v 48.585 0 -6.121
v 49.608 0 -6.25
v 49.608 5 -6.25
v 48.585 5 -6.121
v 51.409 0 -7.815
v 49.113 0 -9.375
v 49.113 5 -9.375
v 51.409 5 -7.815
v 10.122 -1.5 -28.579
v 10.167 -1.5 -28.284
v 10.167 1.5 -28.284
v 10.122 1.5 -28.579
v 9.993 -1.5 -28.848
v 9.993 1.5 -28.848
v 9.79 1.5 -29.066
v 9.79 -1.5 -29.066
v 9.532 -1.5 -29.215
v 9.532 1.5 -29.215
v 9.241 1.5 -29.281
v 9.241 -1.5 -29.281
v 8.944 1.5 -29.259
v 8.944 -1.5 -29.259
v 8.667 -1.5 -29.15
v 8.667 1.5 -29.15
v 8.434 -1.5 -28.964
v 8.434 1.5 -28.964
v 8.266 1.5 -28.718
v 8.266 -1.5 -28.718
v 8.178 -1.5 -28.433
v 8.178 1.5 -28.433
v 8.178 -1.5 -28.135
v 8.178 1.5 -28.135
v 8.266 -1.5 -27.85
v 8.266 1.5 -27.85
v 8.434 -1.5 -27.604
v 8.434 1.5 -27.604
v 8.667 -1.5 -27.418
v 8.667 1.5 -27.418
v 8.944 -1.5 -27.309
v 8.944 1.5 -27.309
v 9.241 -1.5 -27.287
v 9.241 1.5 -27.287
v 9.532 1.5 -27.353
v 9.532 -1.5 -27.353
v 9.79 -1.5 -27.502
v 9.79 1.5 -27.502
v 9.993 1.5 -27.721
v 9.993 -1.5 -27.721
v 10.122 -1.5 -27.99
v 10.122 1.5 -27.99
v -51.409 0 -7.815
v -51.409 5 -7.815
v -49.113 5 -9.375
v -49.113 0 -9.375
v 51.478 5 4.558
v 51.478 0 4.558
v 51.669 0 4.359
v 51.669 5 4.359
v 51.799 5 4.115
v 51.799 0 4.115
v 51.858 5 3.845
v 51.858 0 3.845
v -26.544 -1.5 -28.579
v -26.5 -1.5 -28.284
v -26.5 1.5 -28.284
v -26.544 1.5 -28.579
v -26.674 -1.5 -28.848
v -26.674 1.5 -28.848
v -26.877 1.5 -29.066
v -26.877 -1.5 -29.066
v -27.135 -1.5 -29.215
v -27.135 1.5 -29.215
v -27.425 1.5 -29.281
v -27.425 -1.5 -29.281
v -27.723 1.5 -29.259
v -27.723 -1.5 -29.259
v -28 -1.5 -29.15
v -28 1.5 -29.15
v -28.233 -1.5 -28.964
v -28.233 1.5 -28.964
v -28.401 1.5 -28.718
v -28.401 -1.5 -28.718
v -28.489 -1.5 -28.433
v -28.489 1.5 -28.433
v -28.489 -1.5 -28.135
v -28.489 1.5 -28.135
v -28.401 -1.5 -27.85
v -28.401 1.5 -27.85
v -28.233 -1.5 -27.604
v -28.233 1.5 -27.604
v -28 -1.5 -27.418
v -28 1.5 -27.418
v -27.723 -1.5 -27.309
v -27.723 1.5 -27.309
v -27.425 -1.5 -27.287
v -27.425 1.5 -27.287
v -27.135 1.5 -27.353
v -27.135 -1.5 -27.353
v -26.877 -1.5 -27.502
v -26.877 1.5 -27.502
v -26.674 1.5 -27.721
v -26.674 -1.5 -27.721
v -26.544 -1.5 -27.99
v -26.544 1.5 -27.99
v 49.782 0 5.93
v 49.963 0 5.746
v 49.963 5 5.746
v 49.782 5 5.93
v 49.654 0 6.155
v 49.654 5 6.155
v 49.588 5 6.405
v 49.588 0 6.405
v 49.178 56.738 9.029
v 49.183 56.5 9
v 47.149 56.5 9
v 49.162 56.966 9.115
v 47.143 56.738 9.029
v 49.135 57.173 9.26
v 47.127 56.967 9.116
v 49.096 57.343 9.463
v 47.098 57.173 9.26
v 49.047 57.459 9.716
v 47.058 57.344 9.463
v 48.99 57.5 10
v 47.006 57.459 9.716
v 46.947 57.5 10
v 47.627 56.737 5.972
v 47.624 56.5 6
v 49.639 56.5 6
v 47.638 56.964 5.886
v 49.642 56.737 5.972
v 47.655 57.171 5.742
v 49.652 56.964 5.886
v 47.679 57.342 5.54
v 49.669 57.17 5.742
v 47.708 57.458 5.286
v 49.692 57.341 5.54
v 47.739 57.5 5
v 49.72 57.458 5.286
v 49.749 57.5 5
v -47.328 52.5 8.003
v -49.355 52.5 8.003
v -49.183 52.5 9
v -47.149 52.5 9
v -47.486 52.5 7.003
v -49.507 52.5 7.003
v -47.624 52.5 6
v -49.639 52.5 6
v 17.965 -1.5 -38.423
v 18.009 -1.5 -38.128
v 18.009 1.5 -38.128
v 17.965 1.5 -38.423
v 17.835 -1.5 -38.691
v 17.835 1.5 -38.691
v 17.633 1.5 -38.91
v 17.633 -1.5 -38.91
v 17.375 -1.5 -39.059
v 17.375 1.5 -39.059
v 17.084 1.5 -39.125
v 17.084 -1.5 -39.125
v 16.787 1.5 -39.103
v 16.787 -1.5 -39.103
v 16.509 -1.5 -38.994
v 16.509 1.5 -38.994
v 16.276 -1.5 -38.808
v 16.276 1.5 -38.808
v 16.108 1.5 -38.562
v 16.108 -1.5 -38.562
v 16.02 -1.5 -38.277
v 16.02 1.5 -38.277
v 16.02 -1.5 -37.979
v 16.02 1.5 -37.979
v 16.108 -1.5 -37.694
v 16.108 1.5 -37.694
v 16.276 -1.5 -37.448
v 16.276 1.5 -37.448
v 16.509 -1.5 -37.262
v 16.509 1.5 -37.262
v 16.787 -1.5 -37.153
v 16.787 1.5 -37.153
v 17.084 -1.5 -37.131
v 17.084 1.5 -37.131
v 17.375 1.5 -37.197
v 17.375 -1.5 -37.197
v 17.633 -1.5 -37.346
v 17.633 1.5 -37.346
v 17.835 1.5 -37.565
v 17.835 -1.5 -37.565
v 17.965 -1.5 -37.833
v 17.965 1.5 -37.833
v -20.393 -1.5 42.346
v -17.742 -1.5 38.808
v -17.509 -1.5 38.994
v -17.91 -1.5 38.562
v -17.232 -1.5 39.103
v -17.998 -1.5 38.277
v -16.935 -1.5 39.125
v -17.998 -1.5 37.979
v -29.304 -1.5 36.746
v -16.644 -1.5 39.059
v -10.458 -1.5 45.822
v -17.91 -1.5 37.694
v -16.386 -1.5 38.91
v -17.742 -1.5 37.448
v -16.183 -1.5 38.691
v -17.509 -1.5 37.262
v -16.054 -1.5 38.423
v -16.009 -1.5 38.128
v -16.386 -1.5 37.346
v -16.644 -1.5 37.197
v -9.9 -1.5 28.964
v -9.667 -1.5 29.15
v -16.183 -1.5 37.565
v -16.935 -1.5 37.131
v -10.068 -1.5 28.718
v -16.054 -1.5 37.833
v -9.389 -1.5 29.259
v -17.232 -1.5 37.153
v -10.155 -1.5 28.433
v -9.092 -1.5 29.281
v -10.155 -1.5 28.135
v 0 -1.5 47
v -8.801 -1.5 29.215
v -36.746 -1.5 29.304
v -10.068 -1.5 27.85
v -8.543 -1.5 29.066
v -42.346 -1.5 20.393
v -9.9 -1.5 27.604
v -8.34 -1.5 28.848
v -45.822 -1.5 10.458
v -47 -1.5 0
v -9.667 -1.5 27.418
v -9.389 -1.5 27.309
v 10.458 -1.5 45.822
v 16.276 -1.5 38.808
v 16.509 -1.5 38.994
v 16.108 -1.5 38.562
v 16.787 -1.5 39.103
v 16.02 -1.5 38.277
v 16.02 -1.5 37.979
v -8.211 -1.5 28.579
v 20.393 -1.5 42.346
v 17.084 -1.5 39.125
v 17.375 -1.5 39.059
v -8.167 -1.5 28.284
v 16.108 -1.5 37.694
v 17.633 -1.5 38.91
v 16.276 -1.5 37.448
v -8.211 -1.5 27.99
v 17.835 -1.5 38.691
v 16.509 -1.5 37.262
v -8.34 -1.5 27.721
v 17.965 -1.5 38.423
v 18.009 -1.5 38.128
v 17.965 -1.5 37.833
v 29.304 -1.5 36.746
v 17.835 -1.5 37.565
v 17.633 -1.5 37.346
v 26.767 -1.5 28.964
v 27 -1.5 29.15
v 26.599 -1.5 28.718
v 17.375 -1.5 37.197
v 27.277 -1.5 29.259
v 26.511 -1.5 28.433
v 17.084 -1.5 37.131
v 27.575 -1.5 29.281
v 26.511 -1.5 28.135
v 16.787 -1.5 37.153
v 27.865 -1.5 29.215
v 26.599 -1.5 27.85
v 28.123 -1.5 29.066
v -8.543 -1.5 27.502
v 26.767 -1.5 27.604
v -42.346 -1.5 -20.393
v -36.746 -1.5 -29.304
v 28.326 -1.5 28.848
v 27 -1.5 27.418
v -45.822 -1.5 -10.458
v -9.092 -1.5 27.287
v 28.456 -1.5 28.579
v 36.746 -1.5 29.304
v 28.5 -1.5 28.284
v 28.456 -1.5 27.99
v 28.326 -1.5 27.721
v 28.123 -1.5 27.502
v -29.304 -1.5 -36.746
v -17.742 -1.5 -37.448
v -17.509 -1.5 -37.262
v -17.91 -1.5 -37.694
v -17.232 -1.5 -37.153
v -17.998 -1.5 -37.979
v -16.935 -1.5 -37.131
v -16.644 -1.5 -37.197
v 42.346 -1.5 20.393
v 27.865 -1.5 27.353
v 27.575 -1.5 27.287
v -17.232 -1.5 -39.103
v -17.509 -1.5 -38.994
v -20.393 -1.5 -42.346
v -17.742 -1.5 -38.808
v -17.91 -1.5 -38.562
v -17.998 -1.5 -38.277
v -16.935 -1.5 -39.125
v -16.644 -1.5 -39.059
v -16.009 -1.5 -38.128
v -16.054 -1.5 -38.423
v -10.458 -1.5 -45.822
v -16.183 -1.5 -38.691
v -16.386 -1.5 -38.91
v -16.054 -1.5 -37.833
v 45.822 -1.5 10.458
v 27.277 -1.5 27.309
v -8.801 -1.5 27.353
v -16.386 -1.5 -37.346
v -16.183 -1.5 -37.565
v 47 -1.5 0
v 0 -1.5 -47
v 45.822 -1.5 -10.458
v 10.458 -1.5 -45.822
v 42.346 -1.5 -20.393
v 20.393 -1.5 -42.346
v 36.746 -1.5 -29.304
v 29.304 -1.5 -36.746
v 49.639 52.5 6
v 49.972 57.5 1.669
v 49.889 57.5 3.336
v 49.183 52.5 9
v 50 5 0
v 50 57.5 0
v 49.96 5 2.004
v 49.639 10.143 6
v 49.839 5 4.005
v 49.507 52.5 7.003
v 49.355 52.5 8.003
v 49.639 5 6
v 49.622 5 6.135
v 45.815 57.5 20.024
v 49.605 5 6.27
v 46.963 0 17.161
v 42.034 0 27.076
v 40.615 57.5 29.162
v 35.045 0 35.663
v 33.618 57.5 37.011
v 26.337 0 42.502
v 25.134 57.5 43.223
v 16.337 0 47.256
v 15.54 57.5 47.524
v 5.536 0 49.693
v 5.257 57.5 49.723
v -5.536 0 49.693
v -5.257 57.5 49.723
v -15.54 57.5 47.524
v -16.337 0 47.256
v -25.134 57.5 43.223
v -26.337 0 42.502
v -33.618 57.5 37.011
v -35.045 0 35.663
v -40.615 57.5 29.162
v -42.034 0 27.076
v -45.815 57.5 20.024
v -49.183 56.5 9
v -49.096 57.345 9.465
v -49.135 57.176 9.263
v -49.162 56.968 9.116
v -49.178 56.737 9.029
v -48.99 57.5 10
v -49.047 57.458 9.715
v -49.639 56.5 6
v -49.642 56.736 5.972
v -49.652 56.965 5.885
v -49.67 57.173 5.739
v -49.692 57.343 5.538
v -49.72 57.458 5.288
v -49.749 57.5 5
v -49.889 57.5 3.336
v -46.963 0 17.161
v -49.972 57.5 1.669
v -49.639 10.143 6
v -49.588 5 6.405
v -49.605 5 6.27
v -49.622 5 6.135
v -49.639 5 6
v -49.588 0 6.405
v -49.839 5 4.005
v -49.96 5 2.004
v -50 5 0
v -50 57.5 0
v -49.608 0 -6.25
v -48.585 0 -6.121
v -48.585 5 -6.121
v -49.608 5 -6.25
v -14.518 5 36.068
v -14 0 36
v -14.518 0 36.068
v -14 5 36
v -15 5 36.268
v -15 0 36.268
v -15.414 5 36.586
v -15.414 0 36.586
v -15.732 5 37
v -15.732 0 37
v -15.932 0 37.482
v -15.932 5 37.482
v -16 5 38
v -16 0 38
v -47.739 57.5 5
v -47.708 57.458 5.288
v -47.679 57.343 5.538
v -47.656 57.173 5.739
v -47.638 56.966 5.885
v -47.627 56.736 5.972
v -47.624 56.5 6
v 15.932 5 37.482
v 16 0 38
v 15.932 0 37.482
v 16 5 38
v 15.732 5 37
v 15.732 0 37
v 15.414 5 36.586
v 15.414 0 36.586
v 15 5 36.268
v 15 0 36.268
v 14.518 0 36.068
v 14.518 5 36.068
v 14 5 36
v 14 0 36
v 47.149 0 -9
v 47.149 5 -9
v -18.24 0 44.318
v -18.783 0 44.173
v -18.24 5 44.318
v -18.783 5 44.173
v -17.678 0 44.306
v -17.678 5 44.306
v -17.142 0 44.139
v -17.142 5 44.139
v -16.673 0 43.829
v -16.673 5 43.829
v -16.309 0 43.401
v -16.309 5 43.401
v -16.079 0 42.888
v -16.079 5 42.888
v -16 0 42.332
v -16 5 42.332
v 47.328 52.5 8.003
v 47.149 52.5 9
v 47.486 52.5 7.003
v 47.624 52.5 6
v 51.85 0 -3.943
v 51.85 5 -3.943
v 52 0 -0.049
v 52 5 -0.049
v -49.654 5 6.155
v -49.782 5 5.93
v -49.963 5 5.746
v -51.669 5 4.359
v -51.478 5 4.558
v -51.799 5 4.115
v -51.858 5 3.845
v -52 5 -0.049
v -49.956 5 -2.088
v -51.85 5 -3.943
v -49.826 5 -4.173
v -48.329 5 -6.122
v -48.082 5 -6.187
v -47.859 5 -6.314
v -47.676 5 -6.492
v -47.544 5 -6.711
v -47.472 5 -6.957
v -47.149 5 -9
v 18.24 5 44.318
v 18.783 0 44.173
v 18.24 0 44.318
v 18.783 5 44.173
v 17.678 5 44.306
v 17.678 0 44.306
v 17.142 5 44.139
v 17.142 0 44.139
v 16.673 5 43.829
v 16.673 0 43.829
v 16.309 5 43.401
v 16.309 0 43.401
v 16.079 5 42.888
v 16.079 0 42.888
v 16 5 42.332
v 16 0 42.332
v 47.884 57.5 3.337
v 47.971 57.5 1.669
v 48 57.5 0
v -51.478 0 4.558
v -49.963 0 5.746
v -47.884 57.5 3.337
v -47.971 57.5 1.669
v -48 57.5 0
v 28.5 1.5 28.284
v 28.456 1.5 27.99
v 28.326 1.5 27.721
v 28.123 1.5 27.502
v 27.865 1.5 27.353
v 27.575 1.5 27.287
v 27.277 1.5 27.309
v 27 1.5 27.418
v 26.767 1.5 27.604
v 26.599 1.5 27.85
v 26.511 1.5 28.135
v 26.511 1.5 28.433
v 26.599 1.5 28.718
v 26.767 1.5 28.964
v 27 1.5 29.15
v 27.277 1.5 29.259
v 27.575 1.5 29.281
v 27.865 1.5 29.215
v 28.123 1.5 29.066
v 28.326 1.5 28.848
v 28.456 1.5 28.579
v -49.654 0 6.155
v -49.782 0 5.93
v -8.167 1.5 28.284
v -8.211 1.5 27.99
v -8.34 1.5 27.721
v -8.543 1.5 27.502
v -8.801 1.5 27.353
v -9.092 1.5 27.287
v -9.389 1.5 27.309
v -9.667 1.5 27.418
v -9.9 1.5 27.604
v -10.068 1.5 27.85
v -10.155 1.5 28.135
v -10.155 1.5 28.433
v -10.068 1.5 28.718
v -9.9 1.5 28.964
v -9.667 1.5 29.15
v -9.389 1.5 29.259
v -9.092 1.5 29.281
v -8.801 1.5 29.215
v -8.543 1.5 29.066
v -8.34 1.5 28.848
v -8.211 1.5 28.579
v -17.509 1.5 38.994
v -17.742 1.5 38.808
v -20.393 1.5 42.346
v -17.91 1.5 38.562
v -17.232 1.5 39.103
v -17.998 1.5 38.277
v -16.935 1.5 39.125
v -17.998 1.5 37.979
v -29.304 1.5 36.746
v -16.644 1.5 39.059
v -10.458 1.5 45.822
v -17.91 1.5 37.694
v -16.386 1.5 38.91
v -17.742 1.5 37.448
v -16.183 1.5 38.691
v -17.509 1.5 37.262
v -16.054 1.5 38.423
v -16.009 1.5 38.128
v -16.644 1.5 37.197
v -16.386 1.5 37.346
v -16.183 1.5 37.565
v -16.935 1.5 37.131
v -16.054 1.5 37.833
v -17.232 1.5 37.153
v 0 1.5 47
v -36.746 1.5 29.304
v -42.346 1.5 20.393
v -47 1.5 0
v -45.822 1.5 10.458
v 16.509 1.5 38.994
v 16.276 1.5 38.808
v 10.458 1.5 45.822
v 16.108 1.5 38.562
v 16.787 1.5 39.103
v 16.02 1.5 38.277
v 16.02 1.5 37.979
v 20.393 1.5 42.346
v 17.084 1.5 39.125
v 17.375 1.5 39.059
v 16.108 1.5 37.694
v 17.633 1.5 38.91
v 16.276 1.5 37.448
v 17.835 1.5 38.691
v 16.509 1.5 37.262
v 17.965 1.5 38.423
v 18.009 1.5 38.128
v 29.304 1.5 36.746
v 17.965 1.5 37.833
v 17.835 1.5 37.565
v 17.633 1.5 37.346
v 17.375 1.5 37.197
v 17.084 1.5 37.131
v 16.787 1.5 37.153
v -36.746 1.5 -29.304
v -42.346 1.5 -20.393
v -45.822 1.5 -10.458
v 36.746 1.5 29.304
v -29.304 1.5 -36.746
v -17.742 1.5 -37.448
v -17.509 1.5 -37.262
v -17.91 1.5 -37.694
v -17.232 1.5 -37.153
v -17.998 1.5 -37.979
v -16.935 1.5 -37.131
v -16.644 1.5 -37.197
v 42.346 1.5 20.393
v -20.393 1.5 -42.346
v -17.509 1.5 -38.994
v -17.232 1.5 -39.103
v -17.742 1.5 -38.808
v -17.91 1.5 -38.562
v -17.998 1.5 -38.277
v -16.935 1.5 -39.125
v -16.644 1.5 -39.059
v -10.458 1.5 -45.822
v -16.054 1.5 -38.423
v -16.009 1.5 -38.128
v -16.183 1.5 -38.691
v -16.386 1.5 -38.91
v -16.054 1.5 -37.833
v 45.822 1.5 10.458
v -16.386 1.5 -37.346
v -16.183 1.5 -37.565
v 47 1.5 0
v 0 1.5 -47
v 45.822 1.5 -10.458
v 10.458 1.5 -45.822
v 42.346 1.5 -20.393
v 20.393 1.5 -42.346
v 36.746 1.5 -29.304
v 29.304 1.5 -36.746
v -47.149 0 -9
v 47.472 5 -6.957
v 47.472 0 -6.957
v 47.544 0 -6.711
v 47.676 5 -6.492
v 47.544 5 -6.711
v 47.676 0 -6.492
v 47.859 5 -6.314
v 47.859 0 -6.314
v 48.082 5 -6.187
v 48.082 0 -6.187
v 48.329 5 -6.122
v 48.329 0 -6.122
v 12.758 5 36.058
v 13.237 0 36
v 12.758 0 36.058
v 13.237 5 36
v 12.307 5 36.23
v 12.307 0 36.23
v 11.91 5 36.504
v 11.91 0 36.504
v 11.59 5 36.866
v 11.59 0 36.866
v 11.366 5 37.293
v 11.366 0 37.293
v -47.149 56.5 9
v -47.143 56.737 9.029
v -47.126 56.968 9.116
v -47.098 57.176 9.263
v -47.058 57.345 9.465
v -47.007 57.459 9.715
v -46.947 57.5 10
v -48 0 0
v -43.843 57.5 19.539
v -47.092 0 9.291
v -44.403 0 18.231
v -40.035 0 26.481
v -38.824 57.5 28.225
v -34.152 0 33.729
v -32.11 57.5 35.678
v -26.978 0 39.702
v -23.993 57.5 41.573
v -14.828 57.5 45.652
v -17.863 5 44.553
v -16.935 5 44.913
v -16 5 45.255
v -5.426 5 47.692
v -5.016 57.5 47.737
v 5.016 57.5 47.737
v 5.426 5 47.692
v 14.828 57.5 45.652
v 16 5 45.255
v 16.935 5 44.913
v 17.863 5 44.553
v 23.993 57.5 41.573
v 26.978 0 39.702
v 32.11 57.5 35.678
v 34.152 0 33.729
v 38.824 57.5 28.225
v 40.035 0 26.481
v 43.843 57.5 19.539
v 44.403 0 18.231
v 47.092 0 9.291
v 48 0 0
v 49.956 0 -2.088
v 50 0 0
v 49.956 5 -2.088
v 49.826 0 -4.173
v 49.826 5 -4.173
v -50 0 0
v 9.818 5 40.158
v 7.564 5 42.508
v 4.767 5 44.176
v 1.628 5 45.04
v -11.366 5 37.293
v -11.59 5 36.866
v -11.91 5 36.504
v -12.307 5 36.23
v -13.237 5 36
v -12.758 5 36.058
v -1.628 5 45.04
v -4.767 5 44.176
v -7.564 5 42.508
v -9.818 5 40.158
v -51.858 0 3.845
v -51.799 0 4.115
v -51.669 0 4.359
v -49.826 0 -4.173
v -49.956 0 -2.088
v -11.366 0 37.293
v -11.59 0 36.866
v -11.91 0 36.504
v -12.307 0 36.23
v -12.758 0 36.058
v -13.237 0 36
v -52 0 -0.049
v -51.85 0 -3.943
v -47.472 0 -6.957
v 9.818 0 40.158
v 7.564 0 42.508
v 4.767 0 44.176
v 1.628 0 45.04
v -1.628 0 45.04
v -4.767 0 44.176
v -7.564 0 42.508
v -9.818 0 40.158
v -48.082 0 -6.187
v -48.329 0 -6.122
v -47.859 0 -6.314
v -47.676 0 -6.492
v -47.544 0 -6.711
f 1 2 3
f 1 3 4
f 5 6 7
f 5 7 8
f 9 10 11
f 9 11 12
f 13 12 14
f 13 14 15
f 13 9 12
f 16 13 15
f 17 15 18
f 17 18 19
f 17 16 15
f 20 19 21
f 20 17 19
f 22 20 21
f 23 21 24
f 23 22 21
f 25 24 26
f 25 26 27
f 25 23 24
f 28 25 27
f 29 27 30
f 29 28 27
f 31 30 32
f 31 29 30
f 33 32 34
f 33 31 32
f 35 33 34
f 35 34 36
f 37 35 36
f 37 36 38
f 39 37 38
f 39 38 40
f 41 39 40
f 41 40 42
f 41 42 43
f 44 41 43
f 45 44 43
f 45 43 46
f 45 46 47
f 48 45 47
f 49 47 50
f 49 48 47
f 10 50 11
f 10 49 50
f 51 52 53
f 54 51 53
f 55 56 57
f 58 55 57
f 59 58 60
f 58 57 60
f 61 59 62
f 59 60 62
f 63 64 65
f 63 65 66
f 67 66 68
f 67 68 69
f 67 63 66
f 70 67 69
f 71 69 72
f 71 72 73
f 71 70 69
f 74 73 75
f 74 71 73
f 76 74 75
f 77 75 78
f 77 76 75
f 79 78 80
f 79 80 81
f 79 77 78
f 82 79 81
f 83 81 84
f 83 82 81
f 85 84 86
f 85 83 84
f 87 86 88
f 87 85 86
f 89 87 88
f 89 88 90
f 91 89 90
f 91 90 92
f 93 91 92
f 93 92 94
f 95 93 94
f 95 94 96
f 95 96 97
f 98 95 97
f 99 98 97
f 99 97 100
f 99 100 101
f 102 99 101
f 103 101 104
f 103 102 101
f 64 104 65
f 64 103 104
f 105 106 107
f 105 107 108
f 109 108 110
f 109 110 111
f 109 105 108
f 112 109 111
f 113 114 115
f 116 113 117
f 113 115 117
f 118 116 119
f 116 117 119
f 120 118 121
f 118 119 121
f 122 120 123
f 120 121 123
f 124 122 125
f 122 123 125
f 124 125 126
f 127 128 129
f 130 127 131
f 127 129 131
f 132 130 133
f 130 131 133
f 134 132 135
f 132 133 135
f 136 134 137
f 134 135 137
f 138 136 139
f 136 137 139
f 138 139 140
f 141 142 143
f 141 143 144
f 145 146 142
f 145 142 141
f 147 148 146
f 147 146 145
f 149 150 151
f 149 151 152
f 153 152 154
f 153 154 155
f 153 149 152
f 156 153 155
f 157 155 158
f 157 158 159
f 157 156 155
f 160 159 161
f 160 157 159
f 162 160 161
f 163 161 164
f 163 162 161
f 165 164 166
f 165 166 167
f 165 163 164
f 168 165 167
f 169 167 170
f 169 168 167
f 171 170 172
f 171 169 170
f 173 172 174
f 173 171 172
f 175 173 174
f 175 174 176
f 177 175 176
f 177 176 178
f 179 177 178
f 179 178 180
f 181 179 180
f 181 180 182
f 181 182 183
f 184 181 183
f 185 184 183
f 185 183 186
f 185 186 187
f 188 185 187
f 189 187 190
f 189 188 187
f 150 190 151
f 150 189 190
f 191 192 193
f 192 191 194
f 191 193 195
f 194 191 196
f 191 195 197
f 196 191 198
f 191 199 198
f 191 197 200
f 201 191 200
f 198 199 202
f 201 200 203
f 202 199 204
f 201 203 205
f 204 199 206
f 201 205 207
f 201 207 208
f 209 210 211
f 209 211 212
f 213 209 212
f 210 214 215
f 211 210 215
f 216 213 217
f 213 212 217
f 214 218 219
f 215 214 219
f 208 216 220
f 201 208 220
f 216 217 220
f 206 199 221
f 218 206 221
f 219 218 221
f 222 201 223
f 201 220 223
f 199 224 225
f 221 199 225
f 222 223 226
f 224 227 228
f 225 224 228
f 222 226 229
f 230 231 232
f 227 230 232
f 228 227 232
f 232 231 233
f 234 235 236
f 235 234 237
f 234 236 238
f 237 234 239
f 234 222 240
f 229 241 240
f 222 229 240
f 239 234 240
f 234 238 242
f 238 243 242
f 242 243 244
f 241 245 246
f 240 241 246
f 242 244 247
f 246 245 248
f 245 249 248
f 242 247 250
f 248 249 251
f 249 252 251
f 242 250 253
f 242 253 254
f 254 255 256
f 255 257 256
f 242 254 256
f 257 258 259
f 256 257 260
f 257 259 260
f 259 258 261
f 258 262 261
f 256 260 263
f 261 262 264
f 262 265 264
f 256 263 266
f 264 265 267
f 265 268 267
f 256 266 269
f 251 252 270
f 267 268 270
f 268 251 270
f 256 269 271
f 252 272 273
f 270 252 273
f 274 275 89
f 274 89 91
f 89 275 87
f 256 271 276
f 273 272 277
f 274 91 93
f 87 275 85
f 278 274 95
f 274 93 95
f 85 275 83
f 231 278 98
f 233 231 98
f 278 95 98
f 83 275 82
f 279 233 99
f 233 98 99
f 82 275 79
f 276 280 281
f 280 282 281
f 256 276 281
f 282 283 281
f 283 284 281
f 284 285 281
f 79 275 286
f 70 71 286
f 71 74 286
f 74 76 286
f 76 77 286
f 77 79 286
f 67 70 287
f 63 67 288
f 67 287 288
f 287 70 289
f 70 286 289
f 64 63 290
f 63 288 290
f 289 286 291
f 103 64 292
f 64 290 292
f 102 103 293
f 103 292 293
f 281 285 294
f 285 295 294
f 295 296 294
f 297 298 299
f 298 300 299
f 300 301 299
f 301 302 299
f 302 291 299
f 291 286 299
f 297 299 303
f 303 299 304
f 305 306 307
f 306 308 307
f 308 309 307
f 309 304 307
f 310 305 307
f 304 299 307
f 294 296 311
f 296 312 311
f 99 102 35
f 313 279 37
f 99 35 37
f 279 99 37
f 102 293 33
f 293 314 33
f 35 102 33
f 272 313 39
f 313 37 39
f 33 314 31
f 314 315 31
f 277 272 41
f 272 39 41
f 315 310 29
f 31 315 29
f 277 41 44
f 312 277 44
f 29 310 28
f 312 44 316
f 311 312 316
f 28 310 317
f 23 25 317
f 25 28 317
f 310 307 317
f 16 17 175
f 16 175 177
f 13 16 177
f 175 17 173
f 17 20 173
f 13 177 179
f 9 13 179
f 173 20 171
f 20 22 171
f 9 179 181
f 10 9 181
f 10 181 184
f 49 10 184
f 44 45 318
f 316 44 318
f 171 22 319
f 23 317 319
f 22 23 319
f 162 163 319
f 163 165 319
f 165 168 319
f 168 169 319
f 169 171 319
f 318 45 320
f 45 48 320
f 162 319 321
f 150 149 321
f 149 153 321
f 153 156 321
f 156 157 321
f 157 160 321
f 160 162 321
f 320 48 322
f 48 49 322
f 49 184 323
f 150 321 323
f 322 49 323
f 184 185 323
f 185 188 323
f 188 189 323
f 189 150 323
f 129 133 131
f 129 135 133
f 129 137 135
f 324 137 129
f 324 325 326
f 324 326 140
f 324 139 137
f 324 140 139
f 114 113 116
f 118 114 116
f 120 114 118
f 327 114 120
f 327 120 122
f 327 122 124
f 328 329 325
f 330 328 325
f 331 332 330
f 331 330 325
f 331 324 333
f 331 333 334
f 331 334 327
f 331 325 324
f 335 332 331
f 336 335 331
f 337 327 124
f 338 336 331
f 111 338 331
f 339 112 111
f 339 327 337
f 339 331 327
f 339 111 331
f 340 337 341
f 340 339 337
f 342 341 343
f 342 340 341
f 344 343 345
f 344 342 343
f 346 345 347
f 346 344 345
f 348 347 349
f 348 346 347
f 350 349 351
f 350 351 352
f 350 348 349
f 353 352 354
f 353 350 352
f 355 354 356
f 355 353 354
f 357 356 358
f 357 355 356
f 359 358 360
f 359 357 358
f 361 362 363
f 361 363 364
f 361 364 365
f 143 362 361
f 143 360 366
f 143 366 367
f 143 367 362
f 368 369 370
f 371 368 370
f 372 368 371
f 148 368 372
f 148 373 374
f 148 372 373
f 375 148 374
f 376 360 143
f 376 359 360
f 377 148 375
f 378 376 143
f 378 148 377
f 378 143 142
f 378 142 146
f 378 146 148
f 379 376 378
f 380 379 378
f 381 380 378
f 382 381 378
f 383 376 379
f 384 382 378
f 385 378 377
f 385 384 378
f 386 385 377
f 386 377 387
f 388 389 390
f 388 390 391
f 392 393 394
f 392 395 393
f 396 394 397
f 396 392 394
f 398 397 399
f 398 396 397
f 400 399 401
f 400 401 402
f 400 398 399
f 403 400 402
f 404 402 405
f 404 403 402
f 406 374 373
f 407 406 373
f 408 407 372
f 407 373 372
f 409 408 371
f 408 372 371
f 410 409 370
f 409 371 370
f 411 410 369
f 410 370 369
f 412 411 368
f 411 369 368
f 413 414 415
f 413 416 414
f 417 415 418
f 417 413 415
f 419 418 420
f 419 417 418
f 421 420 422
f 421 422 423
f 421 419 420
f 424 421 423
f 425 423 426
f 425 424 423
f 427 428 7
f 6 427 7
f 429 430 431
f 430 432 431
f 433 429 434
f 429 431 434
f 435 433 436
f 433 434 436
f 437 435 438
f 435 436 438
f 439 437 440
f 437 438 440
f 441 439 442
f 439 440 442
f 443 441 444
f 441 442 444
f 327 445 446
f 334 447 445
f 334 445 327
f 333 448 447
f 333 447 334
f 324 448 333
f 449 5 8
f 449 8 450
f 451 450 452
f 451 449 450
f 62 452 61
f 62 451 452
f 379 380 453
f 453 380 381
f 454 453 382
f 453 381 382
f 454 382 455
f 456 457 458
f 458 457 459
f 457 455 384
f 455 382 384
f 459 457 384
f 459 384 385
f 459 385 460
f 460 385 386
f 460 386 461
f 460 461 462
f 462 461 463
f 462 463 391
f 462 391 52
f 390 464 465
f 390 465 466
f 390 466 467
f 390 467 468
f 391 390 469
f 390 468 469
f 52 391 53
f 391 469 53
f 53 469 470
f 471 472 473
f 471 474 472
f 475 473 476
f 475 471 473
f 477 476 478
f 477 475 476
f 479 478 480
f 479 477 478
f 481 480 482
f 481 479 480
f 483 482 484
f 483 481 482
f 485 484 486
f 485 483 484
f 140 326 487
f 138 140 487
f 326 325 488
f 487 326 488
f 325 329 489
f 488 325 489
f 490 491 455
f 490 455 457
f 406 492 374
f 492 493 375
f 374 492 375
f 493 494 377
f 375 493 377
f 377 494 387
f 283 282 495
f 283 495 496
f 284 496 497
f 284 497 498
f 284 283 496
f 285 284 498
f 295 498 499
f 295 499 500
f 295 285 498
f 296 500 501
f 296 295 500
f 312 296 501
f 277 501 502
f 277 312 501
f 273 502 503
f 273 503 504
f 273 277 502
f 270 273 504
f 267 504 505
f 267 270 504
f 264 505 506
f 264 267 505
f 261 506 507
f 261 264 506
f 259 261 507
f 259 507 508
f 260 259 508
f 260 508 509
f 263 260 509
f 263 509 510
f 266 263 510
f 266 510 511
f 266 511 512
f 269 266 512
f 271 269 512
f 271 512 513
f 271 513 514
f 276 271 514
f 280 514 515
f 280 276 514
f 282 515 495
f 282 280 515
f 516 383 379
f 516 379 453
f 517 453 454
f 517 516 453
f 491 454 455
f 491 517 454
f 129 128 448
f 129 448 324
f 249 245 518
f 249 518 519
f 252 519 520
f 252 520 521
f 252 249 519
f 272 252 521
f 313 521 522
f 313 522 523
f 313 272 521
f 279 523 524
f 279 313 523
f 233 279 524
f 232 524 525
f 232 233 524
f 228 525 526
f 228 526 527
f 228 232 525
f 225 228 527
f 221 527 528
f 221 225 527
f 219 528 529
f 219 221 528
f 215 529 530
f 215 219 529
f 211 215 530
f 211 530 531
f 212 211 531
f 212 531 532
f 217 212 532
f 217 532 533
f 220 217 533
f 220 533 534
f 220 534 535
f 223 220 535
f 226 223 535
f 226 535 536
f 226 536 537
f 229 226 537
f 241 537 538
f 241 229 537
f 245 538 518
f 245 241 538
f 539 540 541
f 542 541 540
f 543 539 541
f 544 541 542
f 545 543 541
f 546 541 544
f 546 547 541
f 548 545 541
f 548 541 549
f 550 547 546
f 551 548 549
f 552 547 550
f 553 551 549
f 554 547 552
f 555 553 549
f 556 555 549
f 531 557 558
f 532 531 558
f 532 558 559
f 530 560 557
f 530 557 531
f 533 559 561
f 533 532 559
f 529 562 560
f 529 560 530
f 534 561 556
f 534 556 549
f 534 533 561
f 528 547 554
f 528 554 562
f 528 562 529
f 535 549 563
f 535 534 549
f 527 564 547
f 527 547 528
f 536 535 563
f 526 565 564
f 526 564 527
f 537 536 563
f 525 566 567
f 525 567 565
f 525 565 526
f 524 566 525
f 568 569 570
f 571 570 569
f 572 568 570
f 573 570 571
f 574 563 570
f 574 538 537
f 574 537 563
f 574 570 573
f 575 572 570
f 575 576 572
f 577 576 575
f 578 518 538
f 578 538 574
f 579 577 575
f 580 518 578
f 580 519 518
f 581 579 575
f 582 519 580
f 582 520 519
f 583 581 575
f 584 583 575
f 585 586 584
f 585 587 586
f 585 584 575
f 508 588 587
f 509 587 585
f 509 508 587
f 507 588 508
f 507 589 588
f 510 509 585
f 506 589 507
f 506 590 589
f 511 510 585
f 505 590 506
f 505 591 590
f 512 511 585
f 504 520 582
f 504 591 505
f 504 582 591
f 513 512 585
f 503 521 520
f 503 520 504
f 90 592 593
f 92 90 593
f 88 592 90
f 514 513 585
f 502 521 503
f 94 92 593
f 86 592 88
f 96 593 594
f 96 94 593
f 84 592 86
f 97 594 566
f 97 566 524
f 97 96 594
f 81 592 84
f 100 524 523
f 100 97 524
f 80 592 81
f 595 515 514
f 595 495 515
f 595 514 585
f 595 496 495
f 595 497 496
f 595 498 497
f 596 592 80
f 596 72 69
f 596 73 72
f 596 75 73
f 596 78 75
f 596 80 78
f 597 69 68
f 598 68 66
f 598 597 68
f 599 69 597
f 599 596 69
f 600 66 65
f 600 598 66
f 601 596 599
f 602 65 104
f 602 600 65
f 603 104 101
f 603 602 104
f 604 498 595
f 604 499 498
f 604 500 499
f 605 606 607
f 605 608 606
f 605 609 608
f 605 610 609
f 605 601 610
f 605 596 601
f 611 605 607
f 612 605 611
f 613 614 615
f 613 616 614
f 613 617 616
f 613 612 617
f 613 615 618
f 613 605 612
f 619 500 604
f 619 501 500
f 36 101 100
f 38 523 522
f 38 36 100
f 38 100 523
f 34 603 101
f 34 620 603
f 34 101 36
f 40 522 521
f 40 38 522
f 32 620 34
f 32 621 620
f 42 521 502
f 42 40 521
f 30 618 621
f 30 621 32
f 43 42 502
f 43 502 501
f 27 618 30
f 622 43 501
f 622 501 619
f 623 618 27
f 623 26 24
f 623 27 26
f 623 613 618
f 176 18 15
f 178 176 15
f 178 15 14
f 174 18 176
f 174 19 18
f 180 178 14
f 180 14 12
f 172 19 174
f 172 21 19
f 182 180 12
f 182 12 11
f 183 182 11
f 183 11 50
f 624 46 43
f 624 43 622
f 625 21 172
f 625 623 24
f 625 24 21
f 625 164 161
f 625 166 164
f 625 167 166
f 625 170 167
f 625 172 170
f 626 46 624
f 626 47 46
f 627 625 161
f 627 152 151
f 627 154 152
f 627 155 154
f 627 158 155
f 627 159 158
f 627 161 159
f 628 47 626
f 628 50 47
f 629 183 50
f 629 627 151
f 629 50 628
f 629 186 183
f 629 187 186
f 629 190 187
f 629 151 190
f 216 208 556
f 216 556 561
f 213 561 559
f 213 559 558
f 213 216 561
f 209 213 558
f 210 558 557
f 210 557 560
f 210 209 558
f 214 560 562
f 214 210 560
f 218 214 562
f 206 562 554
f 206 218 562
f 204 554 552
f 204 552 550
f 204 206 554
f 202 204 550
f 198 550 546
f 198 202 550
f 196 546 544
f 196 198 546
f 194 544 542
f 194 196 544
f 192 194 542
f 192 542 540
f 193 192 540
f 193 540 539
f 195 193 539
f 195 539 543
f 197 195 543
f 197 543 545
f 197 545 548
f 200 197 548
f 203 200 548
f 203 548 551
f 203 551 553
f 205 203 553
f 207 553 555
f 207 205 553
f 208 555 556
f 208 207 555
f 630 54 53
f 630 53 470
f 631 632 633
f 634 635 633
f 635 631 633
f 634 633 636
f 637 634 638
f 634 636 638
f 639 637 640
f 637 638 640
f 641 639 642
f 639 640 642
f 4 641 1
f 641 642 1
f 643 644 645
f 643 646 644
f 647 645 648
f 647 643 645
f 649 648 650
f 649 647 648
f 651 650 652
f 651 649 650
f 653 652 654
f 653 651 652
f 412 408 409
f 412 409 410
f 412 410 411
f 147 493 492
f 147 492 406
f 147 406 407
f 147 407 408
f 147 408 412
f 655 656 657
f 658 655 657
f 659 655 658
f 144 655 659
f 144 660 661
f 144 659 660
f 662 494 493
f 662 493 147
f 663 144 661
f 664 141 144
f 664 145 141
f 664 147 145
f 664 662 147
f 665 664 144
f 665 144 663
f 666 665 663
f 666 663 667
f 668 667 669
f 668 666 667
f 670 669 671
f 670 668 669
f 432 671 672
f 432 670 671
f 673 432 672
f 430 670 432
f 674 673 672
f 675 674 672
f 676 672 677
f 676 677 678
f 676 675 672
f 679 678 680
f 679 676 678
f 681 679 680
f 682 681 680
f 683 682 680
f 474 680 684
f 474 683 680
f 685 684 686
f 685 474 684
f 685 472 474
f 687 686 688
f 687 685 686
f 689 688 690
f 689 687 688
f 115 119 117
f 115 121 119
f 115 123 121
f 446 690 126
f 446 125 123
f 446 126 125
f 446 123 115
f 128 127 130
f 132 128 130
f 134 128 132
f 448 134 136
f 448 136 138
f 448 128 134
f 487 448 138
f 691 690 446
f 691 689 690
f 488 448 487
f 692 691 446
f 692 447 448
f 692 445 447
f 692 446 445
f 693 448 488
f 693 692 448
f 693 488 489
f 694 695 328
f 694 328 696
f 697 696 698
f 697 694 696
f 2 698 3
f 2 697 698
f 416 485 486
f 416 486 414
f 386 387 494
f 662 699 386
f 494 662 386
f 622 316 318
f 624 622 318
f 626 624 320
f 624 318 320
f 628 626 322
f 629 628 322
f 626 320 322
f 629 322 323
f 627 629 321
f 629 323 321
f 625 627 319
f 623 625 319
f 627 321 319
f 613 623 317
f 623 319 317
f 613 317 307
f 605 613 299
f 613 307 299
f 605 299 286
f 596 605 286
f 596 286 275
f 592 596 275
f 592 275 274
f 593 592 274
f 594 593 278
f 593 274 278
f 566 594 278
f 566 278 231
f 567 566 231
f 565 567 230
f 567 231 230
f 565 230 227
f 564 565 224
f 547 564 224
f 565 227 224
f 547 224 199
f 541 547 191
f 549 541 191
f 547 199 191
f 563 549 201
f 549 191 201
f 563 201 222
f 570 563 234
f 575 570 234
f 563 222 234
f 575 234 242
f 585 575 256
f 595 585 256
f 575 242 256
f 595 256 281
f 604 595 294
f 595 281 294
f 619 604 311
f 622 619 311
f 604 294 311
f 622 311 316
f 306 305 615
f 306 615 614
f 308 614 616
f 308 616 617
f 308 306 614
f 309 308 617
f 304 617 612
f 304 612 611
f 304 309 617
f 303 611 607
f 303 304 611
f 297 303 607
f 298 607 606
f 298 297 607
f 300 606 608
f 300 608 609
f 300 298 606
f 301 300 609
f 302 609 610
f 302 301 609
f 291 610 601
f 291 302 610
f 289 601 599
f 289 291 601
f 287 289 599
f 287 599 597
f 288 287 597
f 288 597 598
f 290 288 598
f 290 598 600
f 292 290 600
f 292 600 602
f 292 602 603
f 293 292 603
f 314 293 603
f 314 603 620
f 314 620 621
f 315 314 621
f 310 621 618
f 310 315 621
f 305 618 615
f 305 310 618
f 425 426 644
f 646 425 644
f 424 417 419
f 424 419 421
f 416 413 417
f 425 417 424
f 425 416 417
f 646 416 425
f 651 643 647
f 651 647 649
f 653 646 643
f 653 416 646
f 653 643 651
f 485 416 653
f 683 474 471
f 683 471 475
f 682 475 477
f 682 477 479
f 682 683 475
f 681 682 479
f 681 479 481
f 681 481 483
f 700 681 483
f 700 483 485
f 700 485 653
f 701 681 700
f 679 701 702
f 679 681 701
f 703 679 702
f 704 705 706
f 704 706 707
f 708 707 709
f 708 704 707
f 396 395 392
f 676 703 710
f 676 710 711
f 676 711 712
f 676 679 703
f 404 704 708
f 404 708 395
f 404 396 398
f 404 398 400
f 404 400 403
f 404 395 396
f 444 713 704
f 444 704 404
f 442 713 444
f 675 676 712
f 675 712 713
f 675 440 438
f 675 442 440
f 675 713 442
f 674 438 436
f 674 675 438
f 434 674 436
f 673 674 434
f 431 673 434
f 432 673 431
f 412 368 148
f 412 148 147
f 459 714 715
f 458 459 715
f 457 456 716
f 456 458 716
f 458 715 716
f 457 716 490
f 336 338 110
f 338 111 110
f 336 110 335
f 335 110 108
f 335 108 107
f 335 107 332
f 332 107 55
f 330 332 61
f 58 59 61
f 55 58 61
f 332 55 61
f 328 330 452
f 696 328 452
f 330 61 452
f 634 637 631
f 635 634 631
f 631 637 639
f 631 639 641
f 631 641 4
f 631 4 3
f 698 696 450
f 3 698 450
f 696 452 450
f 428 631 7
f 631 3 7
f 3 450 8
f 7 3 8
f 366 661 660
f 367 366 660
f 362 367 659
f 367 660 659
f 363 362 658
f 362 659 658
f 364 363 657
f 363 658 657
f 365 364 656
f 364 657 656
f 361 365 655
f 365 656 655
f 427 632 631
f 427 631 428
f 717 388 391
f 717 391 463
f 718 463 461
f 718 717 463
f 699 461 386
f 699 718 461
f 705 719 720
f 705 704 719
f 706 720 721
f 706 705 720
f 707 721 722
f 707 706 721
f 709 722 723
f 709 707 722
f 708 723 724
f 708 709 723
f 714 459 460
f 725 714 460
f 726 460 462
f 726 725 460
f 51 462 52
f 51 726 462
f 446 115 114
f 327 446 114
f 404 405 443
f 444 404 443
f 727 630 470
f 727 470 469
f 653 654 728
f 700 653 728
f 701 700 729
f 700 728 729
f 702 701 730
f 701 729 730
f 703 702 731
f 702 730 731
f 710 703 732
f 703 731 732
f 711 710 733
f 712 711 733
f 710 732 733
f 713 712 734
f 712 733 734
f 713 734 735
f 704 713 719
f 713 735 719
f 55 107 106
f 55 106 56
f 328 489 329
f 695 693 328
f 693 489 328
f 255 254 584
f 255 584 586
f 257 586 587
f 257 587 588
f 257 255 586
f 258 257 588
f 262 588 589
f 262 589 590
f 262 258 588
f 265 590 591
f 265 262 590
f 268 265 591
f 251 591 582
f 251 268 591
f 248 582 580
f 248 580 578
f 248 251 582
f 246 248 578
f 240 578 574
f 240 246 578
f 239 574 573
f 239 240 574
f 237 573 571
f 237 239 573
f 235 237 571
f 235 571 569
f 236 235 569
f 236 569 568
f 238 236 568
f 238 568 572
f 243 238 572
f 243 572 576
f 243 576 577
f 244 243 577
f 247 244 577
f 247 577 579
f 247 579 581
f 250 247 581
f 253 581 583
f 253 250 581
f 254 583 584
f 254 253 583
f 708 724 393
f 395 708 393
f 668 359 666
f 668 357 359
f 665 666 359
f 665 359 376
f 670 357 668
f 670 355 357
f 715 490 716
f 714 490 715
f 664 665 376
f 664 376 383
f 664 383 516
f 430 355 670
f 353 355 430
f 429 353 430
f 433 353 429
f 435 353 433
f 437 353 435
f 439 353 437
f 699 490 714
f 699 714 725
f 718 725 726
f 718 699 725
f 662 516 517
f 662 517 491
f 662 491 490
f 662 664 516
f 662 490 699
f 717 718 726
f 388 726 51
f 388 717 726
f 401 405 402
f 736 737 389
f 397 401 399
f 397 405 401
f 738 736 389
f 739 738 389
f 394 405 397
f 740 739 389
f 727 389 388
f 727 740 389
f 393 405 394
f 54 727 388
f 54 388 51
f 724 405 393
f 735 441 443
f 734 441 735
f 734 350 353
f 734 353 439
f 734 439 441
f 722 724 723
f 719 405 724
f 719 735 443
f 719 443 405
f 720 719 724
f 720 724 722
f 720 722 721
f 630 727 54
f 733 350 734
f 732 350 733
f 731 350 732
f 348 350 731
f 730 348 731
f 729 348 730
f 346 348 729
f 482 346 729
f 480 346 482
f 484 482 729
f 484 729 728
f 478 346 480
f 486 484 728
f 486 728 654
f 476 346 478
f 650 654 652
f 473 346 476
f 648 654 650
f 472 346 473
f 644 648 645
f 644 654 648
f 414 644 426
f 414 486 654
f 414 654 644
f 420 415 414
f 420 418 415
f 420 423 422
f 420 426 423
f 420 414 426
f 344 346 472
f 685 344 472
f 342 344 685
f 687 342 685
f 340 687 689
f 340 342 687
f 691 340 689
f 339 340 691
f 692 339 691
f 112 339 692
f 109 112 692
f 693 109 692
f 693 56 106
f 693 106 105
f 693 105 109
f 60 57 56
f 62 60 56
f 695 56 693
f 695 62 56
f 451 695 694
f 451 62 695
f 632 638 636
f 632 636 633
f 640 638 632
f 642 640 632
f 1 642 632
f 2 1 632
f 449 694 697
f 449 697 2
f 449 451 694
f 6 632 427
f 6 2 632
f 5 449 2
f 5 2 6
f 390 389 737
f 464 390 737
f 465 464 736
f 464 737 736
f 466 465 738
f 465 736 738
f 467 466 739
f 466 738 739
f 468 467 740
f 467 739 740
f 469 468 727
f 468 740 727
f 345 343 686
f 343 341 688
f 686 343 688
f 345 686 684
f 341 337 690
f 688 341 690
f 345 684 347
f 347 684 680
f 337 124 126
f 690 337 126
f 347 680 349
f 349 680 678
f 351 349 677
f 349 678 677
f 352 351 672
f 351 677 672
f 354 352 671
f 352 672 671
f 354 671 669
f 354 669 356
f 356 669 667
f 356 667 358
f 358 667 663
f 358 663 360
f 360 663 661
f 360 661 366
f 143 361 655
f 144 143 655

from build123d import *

# Parameters (mm, degrees)
A_BASE_T_START         = -1.5
A_BASE_T_OUTLINE_R     = 47
A_BASE_T_OUTLINE_R_2   = 1
A_BASE_T_DEPTH         = 3
SHELL_BODY_DEPTH       = 57.5
SKETCH3_W              = 2.489993647
SKETCH3_H              = 3
CLIP_CAVITY_DEPTH      = 5
CLIP_DEPTH             = 5
TOP_CLAMP_DEPTH        = 5
CLIP_CHAMFER_SIZE      = 2
CONTOURING_R           = 1
INTERFACE_CONTOURING_R = 2


with BuildPart() as part:
    # a_base_t: read off the stored shape, not the designer's step
    # a_base_t outline → a_base_t (new body)
    with BuildSketch(Plane(origin=(0, 0, 0), x_dir=(1, 0, 0), z_dir=(0, 1, 0)).offset(A_BASE_T_START)):
        Circle(A_BASE_T_OUTLINE_R)
        with Locations((-17.009259258, -38.128042167)):
            Circle(A_BASE_T_OUTLINE_R_2, mode=Mode.SUBTRACT)
        with Locations((-9.166666665, -28.284271247)):
            Circle(A_BASE_T_OUTLINE_R_2, mode=Mode.SUBTRACT)
        with Locations((17.009259258, -38.128042167)):
            Circle(A_BASE_T_OUTLINE_R_2, mode=Mode.SUBTRACT)
        with Locations((27.5, -28.284271247)):
            Circle(A_BASE_T_OUTLINE_R_2, mode=Mode.SUBTRACT)
        with Locations((-27.5, 28.284271247)):
            Circle(A_BASE_T_OUTLINE_R_2, mode=Mode.SUBTRACT)
        with Locations((-17.009259258, 38.128042167)):
            Circle(A_BASE_T_OUTLINE_R_2, mode=Mode.SUBTRACT)
        with Locations((9.166666665, 28.284271247)):
            Circle(A_BASE_T_OUTLINE_R_2, mode=Mode.SUBTRACT)
        with Locations((17.009259258, 38.128042167)):
            Circle(A_BASE_T_OUTLINE_R_2, mode=Mode.SUBTRACT)
    extrude(amount=A_BASE_T_DEPTH)


with BuildPart() as body_2:
    # Sketch1 → Shell Body (new body)
    with BuildSketch(Plane(origin=(0, 0, 0), x_dir=(1, 0, 0), z_dir=(0, 1, 0))):
        with BuildLine():
            Line((-50, 0), (-48, 0))
            ThreePointArc((-48, 0), (0, -48), (48, 0))
            Line((48, 0), (50, 0))
            ThreePointArc((50, 0), (0, -50), (-50, 0))
        make_face()
    extrude(amount=SHELL_BODY_DEPTH)

    # Sketch3 → Clip Cavity (cut)
    with BuildSketch(Plane(origin=(0, 57.5, 0), x_dir=(1, 0, 0), z_dir=(0, 1, 0))):
        with Locations((48.393697761, -7.5)):
            Rectangle(SKETCH3_W, SKETCH3_H)
        with Locations((-48.393697761, -7.5)):
            Rectangle(SKETCH3_W, SKETCH3_H)
    extrude(amount=-CLIP_CAVITY_DEPTH, mode=Mode.SUBTRACT)

    # Sketch4 → Clip (add)
    with BuildSketch(Plane.XZ):
        with BuildLine():
            Line((47.148700937, -9), (51.077759348, -9.75))
            ThreePointArc((51.077759348, -9.75), (51.969657629, -1.776143553), (51.624242367, 6.24))
            Line((51.624242367, 6.24), (49.638694584, 6))
            ThreePointArc((49.638694584, 6), (49.90959191, 3.005434312), (50, 0))
            ThreePointArc((50, 0), (49.901862962, -3.131145627), (49.607837082, -6.25))
            Line((49.607837082, -6.25), (47.623523599, -6))
            Line((47.623523599, -6), (47.148700937, -9))
        make_face()
        with BuildLine():
            ThreePointArc((-50, 0), (-49.90959191, 3.005434312), (-49.638694584, 6))
            Line((-49.638694584, 6), (-51.624242367, 6.24))
            ThreePointArc((-51.624242367, 6.24), (-51.969657629, -1.776143553), (-51.077759348, -9.75))
            Line((-51.077759348, -9.75), (-47.148700937, -9))
            Line((-47.148700937, -9), (-47.623523599, -6))
            Line((-47.623523599, -6), (-49.607837082, -6.25))
            ThreePointArc((-49.607837082, -6.25), (-49.901862962, -3.131145627), (-50, 0))
        make_face()
    extrude(amount=-CLIP_DEPTH)

    # Sketch5 → Top Clamp (add)
    with BuildSketch(Plane.XZ):
        with BuildLine():
            Line((16, 45.254833996), (16, 36))
            Line((16, 36), (11.773805672, 36))
            ThreePointArc((11.773805672, 36), (0, 45.15), (-11.773805672, 36))
            Line((-11.773805672, 36), (-16, 36))
            Line((-16, 36), (-16, 45.254833996))
            ThreePointArc((-16, 45.254833996), (0, 48), (16, 45.254833996))
        make_face()
    extrude(amount=-TOP_CLAMP_DEPTH)

    # Clip Chamfer
    # the kernel refuses this chamfer: 2 mm, written as the material it takes off along each edge
    with BuildSketch(Plane(origin=(-51.624242367, -5.143365976, 6.24), x_dir=(0.9927738916792685, 0, -0.11999999999999984), z_dir=(0, 1, 0))) as clip_chamfer_piece_1_section:
        with BuildLine():
            Line((CLIP_CHAMFER_SIZE, 0), (0.037062475, 1.962937525))
            ThreePointArc((0.037062475, 1.962937525), (0.009797411, 1.009373468), (0, 0))
            Line((0, 0), (CLIP_CHAMFER_SIZE, 0))
        make_face()
    clip_chamfer_piece_1 = extrude(amount=15.286731952, mode=Mode.PRIVATE)
    clip_chamfer_piece_1 = clip_chamfer_piece_1 - Plane(origin=(0, -5.143365976, 0), x_dir=(1, 0, 0), z_dir=(0, -1, 0)) * Cylinder(50, 39, mode=Mode.PRIVATE)
    add(clip_chamfer_piece_1, mode=Mode.SUBTRACT)
    with BuildSketch(Plane(origin=(-51.077759348, -5.143365976, -9.75), x_dir=(-0.1689236286537023, 0, 0.9856291430768807), z_dir=(0, 1, 0))) as clip_chamfer_piece_2:
        with BuildLine():
            Line((1.963287385, 0), (CLIP_CHAMFER_SIZE * 0.0188777633164, CLIP_CHAMFER_SIZE * 0.999821799148))
            Line((CLIP_CHAMFER_SIZE * 0.0188777633164, CLIP_CHAMFER_SIZE * 0.999821799148), (0, 0))
            ThreePointArc((0, 0), (1.00937855, -0.009259048), (1.963287385, 0))
        make_face()
    extrude(amount=15.286731952, mode=Mode.SUBTRACT)
    with BuildSketch(Plane(origin=(51.077759348, -5.143365976, -9.75), x_dir=(-0.9822646028438573, 0, 0.18749999999999856), z_dir=(0, 1, 0))) as clip_chamfer_piece_3:
        with BuildLine():
            Line((CLIP_CHAMFER_SIZE, 0), (0.037062475, 1.962937525))
            ThreePointArc((0.037062475, 1.962937525), (0.009797411, 1.009373468), (0, 0))
            Line((0, 0), (CLIP_CHAMFER_SIZE, 0))
        make_face()
    extrude(amount=15.286731952, mode=Mode.SUBTRACT)
    with BuildSketch(Plane(origin=(51.624242367, -5.143365976, 6.24), x_dir=(-0.9927738916792685, 0, -0.12000000000000073), z_dir=(0, 1, 0))) as clip_chamfer_piece_4_section:
        with BuildLine():
            Line((CLIP_CHAMFER_SIZE, 0), (0.037062475, -1.962937525))
            ThreePointArc((0.037062475, -1.962937525), (0.009797411, -1.009373468), (0, 0))
            Line((0, 0), (CLIP_CHAMFER_SIZE, 0))
        make_face()
    clip_chamfer_piece_4 = extrude(amount=15.286731952, mode=Mode.PRIVATE)
    clip_chamfer_piece_4 = clip_chamfer_piece_4 - Plane(origin=(0, -5.143365976, 0), x_dir=(1, 0, 0), z_dir=(0, -1, 0)) * Cylinder(50, 39, mode=Mode.PRIVATE)
    add(clip_chamfer_piece_4, mode=Mode.SUBTRACT)

    # Contouring
    # the kernel refuses this fillet: 1 mm, written as the material it adds along each edge
    with BuildSketch(Plane(origin=(-49.638694584, 0, 6), x_dir=(0.12404711519579938, 0, 0.9922763290594007), z_dir=(0, 1, 0))) as contouring_piece_1:
        with BuildLine():
            CenterArc((0.41183536, -0.999991687), CONTOURING_R, 90.233628647, 44.532742706)
            Line((-0.29238226, -0.290007501), (0, 0))
            ThreePointArc((0, 0), (0.203878891, -0.000415668), (0.407757782, 0))
        make_face()
    extrude(amount=5)
    with BuildSketch(Plane(origin=(49.638694584, 0, 6), x_dir=(-0.12404711519576721, 0, 0.9922763290594048), z_dir=(0, 1, 0))) as contouring_piece_2:
        with BuildLine():
            CenterArc((0.41183536, 0.999991687), CONTOURING_R, 225.233628647, 44.532742706)
            Line((-0.29238226, 0.290007501), (0, 0))
            ThreePointArc((0, 0), (0.203878891, 0.000415668), (0.407757782, 0))
        make_face()
    extrude(amount=5)
    # the kernel refuses this fillet: 1 mm, written as the material it takes off along each edge
    with BuildSketch(Plane(origin=(-51.823000213, -1.108298517, 4.286799377), x_dir=(-0.07818952348583504, 0, -0.9969385128567649), z_dir=(0, 1, 0))) as contouring_2_piece_1:
        with BuildLine():
            CenterArc((0.43905672, -0.999990915), CONTOURING_R, 89.755765309, 47.651830218)
            Line((-0.297130092, -0.323212533), (0, 0))
            ThreePointArc((0, 0), (0.221659703, 0.000472435), (0.443319407, 0))
        make_face()
    extrude(amount=7.216597034, mode=Mode.SUBTRACT)
    with BuildSketch(Plane(origin=(-47.623523599, -2.422115112, -6), x_dir=(-0.9921567416492214, 0, -0.12500000000000036), z_dir=(0, 1, 0))) as contouring_2_piece_2:
        with BuildLine():
            CenterArc((CONTOURING_R * 0.968846044958, -CONTOURING_R), CONTOURING_R, 90, 88.186916453)
            Line((-CONTOURING_R * 0.0306533166715, -CONTOURING_R * 0.968361003452), (0, 0))
            Line((0, 0), (CONTOURING_R * 0.968846044958, 0))
        make_face()
    extrude(amount=9.844230225, mode=Mode.SUBTRACT)
    with BuildSketch(Plane(origin=(47.623523599, -2.422115112, -6), x_dir=(0.9921567416492214, 0, -0.12500000000000036), z_dir=(0, 1, 0))) as contouring_2_piece_3:
        with BuildLine():
            CenterArc((CONTOURING_R * 0.968846044958, CONTOURING_R), CONTOURING_R, 181.813083547, 88.186916453)
            Line((-CONTOURING_R * 0.0306533166715, CONTOURING_R * 0.968361003452), (0, 0))
            Line((0, 0), (CONTOURING_R * 0.968846044958, 0))
        make_face()
    extrude(amount=9.844230225, mode=Mode.SUBTRACT)
    with BuildSketch(Plane(origin=(51.823000213, -1.108298517, 4.286799377), x_dir=(-0.7868499647334531, 0, 0.6171443372493695), z_dir=(0, 1, 0))) as contouring_2_piece_4:
        with BuildLine():
            CenterArc((0.439036027, -1), CONTOURING_R, 90, 47.651830218)
            ThreePointArc((-0.300028991, -0.326365901), (-0.150362296, -0.162863217), (0, 0))
            Line((0, 0), (0.439036027, 0))
        make_face()
    extrude(amount=7.216597034, mode=Mode.SUBTRACT)
    with BuildSketch(Plane(origin=(-52.138694584, 57.5, 6), x_dir=(0, -1, 0), z_dir=(1, 0, 0)), Plane(origin=(52.138694584, 57.5, 6), x_dir=(0, 0, -1), z_dir=(-1, 0, 0))) as contouring_2_piece_5:
        with BuildLine():
            CenterArc((CONTOURING_R, CONTOURING_R), CONTOURING_R, 180, 90)
            Line((0, CONTOURING_R), (0, 0))
            Line((0, 0), (CONTOURING_R, 0))
        make_face()
    extrude(amount=7.015170985, mode=Mode.SUBTRACT)
    with BuildSketch(Plane(origin=(-44.648700937, 57.5, 9), x_dir=(0, 0, 1), z_dir=(-1, 0, 0)), Plane(origin=(44.648700937, 57.5, 9), x_dir=(0, -1, 0), z_dir=(1, 0, 0))) as contouring_2_piece_6:
        with BuildLine():
            CenterArc((CONTOURING_R, -CONTOURING_R), CONTOURING_R, 90, 90)
            Line((0, -CONTOURING_R), (0, 0))
            Line((0, 0), (CONTOURING_R, 0))
        make_face()
    extrude(amount=7.034629573, mode=Mode.SUBTRACT)

    # Interface Contouring
    interface_contouring_edges = [body_2.edges().sort_by_distance(p)[0] for p in [
        (-16, 2.5, 45.254833996),
        (16, 2.5, 45.254833996),
        (16, 2.5, 36),
        (11.773805672, 2.5, 36),
        (-11.773805672, 2.5, 36),
        (-16, 2.5, 36),
    ]]
    fillet(interface_contouring_edges, radius=INTERFACE_CONTOURING_R)


solid = Compound([part.part, body_2.part])
